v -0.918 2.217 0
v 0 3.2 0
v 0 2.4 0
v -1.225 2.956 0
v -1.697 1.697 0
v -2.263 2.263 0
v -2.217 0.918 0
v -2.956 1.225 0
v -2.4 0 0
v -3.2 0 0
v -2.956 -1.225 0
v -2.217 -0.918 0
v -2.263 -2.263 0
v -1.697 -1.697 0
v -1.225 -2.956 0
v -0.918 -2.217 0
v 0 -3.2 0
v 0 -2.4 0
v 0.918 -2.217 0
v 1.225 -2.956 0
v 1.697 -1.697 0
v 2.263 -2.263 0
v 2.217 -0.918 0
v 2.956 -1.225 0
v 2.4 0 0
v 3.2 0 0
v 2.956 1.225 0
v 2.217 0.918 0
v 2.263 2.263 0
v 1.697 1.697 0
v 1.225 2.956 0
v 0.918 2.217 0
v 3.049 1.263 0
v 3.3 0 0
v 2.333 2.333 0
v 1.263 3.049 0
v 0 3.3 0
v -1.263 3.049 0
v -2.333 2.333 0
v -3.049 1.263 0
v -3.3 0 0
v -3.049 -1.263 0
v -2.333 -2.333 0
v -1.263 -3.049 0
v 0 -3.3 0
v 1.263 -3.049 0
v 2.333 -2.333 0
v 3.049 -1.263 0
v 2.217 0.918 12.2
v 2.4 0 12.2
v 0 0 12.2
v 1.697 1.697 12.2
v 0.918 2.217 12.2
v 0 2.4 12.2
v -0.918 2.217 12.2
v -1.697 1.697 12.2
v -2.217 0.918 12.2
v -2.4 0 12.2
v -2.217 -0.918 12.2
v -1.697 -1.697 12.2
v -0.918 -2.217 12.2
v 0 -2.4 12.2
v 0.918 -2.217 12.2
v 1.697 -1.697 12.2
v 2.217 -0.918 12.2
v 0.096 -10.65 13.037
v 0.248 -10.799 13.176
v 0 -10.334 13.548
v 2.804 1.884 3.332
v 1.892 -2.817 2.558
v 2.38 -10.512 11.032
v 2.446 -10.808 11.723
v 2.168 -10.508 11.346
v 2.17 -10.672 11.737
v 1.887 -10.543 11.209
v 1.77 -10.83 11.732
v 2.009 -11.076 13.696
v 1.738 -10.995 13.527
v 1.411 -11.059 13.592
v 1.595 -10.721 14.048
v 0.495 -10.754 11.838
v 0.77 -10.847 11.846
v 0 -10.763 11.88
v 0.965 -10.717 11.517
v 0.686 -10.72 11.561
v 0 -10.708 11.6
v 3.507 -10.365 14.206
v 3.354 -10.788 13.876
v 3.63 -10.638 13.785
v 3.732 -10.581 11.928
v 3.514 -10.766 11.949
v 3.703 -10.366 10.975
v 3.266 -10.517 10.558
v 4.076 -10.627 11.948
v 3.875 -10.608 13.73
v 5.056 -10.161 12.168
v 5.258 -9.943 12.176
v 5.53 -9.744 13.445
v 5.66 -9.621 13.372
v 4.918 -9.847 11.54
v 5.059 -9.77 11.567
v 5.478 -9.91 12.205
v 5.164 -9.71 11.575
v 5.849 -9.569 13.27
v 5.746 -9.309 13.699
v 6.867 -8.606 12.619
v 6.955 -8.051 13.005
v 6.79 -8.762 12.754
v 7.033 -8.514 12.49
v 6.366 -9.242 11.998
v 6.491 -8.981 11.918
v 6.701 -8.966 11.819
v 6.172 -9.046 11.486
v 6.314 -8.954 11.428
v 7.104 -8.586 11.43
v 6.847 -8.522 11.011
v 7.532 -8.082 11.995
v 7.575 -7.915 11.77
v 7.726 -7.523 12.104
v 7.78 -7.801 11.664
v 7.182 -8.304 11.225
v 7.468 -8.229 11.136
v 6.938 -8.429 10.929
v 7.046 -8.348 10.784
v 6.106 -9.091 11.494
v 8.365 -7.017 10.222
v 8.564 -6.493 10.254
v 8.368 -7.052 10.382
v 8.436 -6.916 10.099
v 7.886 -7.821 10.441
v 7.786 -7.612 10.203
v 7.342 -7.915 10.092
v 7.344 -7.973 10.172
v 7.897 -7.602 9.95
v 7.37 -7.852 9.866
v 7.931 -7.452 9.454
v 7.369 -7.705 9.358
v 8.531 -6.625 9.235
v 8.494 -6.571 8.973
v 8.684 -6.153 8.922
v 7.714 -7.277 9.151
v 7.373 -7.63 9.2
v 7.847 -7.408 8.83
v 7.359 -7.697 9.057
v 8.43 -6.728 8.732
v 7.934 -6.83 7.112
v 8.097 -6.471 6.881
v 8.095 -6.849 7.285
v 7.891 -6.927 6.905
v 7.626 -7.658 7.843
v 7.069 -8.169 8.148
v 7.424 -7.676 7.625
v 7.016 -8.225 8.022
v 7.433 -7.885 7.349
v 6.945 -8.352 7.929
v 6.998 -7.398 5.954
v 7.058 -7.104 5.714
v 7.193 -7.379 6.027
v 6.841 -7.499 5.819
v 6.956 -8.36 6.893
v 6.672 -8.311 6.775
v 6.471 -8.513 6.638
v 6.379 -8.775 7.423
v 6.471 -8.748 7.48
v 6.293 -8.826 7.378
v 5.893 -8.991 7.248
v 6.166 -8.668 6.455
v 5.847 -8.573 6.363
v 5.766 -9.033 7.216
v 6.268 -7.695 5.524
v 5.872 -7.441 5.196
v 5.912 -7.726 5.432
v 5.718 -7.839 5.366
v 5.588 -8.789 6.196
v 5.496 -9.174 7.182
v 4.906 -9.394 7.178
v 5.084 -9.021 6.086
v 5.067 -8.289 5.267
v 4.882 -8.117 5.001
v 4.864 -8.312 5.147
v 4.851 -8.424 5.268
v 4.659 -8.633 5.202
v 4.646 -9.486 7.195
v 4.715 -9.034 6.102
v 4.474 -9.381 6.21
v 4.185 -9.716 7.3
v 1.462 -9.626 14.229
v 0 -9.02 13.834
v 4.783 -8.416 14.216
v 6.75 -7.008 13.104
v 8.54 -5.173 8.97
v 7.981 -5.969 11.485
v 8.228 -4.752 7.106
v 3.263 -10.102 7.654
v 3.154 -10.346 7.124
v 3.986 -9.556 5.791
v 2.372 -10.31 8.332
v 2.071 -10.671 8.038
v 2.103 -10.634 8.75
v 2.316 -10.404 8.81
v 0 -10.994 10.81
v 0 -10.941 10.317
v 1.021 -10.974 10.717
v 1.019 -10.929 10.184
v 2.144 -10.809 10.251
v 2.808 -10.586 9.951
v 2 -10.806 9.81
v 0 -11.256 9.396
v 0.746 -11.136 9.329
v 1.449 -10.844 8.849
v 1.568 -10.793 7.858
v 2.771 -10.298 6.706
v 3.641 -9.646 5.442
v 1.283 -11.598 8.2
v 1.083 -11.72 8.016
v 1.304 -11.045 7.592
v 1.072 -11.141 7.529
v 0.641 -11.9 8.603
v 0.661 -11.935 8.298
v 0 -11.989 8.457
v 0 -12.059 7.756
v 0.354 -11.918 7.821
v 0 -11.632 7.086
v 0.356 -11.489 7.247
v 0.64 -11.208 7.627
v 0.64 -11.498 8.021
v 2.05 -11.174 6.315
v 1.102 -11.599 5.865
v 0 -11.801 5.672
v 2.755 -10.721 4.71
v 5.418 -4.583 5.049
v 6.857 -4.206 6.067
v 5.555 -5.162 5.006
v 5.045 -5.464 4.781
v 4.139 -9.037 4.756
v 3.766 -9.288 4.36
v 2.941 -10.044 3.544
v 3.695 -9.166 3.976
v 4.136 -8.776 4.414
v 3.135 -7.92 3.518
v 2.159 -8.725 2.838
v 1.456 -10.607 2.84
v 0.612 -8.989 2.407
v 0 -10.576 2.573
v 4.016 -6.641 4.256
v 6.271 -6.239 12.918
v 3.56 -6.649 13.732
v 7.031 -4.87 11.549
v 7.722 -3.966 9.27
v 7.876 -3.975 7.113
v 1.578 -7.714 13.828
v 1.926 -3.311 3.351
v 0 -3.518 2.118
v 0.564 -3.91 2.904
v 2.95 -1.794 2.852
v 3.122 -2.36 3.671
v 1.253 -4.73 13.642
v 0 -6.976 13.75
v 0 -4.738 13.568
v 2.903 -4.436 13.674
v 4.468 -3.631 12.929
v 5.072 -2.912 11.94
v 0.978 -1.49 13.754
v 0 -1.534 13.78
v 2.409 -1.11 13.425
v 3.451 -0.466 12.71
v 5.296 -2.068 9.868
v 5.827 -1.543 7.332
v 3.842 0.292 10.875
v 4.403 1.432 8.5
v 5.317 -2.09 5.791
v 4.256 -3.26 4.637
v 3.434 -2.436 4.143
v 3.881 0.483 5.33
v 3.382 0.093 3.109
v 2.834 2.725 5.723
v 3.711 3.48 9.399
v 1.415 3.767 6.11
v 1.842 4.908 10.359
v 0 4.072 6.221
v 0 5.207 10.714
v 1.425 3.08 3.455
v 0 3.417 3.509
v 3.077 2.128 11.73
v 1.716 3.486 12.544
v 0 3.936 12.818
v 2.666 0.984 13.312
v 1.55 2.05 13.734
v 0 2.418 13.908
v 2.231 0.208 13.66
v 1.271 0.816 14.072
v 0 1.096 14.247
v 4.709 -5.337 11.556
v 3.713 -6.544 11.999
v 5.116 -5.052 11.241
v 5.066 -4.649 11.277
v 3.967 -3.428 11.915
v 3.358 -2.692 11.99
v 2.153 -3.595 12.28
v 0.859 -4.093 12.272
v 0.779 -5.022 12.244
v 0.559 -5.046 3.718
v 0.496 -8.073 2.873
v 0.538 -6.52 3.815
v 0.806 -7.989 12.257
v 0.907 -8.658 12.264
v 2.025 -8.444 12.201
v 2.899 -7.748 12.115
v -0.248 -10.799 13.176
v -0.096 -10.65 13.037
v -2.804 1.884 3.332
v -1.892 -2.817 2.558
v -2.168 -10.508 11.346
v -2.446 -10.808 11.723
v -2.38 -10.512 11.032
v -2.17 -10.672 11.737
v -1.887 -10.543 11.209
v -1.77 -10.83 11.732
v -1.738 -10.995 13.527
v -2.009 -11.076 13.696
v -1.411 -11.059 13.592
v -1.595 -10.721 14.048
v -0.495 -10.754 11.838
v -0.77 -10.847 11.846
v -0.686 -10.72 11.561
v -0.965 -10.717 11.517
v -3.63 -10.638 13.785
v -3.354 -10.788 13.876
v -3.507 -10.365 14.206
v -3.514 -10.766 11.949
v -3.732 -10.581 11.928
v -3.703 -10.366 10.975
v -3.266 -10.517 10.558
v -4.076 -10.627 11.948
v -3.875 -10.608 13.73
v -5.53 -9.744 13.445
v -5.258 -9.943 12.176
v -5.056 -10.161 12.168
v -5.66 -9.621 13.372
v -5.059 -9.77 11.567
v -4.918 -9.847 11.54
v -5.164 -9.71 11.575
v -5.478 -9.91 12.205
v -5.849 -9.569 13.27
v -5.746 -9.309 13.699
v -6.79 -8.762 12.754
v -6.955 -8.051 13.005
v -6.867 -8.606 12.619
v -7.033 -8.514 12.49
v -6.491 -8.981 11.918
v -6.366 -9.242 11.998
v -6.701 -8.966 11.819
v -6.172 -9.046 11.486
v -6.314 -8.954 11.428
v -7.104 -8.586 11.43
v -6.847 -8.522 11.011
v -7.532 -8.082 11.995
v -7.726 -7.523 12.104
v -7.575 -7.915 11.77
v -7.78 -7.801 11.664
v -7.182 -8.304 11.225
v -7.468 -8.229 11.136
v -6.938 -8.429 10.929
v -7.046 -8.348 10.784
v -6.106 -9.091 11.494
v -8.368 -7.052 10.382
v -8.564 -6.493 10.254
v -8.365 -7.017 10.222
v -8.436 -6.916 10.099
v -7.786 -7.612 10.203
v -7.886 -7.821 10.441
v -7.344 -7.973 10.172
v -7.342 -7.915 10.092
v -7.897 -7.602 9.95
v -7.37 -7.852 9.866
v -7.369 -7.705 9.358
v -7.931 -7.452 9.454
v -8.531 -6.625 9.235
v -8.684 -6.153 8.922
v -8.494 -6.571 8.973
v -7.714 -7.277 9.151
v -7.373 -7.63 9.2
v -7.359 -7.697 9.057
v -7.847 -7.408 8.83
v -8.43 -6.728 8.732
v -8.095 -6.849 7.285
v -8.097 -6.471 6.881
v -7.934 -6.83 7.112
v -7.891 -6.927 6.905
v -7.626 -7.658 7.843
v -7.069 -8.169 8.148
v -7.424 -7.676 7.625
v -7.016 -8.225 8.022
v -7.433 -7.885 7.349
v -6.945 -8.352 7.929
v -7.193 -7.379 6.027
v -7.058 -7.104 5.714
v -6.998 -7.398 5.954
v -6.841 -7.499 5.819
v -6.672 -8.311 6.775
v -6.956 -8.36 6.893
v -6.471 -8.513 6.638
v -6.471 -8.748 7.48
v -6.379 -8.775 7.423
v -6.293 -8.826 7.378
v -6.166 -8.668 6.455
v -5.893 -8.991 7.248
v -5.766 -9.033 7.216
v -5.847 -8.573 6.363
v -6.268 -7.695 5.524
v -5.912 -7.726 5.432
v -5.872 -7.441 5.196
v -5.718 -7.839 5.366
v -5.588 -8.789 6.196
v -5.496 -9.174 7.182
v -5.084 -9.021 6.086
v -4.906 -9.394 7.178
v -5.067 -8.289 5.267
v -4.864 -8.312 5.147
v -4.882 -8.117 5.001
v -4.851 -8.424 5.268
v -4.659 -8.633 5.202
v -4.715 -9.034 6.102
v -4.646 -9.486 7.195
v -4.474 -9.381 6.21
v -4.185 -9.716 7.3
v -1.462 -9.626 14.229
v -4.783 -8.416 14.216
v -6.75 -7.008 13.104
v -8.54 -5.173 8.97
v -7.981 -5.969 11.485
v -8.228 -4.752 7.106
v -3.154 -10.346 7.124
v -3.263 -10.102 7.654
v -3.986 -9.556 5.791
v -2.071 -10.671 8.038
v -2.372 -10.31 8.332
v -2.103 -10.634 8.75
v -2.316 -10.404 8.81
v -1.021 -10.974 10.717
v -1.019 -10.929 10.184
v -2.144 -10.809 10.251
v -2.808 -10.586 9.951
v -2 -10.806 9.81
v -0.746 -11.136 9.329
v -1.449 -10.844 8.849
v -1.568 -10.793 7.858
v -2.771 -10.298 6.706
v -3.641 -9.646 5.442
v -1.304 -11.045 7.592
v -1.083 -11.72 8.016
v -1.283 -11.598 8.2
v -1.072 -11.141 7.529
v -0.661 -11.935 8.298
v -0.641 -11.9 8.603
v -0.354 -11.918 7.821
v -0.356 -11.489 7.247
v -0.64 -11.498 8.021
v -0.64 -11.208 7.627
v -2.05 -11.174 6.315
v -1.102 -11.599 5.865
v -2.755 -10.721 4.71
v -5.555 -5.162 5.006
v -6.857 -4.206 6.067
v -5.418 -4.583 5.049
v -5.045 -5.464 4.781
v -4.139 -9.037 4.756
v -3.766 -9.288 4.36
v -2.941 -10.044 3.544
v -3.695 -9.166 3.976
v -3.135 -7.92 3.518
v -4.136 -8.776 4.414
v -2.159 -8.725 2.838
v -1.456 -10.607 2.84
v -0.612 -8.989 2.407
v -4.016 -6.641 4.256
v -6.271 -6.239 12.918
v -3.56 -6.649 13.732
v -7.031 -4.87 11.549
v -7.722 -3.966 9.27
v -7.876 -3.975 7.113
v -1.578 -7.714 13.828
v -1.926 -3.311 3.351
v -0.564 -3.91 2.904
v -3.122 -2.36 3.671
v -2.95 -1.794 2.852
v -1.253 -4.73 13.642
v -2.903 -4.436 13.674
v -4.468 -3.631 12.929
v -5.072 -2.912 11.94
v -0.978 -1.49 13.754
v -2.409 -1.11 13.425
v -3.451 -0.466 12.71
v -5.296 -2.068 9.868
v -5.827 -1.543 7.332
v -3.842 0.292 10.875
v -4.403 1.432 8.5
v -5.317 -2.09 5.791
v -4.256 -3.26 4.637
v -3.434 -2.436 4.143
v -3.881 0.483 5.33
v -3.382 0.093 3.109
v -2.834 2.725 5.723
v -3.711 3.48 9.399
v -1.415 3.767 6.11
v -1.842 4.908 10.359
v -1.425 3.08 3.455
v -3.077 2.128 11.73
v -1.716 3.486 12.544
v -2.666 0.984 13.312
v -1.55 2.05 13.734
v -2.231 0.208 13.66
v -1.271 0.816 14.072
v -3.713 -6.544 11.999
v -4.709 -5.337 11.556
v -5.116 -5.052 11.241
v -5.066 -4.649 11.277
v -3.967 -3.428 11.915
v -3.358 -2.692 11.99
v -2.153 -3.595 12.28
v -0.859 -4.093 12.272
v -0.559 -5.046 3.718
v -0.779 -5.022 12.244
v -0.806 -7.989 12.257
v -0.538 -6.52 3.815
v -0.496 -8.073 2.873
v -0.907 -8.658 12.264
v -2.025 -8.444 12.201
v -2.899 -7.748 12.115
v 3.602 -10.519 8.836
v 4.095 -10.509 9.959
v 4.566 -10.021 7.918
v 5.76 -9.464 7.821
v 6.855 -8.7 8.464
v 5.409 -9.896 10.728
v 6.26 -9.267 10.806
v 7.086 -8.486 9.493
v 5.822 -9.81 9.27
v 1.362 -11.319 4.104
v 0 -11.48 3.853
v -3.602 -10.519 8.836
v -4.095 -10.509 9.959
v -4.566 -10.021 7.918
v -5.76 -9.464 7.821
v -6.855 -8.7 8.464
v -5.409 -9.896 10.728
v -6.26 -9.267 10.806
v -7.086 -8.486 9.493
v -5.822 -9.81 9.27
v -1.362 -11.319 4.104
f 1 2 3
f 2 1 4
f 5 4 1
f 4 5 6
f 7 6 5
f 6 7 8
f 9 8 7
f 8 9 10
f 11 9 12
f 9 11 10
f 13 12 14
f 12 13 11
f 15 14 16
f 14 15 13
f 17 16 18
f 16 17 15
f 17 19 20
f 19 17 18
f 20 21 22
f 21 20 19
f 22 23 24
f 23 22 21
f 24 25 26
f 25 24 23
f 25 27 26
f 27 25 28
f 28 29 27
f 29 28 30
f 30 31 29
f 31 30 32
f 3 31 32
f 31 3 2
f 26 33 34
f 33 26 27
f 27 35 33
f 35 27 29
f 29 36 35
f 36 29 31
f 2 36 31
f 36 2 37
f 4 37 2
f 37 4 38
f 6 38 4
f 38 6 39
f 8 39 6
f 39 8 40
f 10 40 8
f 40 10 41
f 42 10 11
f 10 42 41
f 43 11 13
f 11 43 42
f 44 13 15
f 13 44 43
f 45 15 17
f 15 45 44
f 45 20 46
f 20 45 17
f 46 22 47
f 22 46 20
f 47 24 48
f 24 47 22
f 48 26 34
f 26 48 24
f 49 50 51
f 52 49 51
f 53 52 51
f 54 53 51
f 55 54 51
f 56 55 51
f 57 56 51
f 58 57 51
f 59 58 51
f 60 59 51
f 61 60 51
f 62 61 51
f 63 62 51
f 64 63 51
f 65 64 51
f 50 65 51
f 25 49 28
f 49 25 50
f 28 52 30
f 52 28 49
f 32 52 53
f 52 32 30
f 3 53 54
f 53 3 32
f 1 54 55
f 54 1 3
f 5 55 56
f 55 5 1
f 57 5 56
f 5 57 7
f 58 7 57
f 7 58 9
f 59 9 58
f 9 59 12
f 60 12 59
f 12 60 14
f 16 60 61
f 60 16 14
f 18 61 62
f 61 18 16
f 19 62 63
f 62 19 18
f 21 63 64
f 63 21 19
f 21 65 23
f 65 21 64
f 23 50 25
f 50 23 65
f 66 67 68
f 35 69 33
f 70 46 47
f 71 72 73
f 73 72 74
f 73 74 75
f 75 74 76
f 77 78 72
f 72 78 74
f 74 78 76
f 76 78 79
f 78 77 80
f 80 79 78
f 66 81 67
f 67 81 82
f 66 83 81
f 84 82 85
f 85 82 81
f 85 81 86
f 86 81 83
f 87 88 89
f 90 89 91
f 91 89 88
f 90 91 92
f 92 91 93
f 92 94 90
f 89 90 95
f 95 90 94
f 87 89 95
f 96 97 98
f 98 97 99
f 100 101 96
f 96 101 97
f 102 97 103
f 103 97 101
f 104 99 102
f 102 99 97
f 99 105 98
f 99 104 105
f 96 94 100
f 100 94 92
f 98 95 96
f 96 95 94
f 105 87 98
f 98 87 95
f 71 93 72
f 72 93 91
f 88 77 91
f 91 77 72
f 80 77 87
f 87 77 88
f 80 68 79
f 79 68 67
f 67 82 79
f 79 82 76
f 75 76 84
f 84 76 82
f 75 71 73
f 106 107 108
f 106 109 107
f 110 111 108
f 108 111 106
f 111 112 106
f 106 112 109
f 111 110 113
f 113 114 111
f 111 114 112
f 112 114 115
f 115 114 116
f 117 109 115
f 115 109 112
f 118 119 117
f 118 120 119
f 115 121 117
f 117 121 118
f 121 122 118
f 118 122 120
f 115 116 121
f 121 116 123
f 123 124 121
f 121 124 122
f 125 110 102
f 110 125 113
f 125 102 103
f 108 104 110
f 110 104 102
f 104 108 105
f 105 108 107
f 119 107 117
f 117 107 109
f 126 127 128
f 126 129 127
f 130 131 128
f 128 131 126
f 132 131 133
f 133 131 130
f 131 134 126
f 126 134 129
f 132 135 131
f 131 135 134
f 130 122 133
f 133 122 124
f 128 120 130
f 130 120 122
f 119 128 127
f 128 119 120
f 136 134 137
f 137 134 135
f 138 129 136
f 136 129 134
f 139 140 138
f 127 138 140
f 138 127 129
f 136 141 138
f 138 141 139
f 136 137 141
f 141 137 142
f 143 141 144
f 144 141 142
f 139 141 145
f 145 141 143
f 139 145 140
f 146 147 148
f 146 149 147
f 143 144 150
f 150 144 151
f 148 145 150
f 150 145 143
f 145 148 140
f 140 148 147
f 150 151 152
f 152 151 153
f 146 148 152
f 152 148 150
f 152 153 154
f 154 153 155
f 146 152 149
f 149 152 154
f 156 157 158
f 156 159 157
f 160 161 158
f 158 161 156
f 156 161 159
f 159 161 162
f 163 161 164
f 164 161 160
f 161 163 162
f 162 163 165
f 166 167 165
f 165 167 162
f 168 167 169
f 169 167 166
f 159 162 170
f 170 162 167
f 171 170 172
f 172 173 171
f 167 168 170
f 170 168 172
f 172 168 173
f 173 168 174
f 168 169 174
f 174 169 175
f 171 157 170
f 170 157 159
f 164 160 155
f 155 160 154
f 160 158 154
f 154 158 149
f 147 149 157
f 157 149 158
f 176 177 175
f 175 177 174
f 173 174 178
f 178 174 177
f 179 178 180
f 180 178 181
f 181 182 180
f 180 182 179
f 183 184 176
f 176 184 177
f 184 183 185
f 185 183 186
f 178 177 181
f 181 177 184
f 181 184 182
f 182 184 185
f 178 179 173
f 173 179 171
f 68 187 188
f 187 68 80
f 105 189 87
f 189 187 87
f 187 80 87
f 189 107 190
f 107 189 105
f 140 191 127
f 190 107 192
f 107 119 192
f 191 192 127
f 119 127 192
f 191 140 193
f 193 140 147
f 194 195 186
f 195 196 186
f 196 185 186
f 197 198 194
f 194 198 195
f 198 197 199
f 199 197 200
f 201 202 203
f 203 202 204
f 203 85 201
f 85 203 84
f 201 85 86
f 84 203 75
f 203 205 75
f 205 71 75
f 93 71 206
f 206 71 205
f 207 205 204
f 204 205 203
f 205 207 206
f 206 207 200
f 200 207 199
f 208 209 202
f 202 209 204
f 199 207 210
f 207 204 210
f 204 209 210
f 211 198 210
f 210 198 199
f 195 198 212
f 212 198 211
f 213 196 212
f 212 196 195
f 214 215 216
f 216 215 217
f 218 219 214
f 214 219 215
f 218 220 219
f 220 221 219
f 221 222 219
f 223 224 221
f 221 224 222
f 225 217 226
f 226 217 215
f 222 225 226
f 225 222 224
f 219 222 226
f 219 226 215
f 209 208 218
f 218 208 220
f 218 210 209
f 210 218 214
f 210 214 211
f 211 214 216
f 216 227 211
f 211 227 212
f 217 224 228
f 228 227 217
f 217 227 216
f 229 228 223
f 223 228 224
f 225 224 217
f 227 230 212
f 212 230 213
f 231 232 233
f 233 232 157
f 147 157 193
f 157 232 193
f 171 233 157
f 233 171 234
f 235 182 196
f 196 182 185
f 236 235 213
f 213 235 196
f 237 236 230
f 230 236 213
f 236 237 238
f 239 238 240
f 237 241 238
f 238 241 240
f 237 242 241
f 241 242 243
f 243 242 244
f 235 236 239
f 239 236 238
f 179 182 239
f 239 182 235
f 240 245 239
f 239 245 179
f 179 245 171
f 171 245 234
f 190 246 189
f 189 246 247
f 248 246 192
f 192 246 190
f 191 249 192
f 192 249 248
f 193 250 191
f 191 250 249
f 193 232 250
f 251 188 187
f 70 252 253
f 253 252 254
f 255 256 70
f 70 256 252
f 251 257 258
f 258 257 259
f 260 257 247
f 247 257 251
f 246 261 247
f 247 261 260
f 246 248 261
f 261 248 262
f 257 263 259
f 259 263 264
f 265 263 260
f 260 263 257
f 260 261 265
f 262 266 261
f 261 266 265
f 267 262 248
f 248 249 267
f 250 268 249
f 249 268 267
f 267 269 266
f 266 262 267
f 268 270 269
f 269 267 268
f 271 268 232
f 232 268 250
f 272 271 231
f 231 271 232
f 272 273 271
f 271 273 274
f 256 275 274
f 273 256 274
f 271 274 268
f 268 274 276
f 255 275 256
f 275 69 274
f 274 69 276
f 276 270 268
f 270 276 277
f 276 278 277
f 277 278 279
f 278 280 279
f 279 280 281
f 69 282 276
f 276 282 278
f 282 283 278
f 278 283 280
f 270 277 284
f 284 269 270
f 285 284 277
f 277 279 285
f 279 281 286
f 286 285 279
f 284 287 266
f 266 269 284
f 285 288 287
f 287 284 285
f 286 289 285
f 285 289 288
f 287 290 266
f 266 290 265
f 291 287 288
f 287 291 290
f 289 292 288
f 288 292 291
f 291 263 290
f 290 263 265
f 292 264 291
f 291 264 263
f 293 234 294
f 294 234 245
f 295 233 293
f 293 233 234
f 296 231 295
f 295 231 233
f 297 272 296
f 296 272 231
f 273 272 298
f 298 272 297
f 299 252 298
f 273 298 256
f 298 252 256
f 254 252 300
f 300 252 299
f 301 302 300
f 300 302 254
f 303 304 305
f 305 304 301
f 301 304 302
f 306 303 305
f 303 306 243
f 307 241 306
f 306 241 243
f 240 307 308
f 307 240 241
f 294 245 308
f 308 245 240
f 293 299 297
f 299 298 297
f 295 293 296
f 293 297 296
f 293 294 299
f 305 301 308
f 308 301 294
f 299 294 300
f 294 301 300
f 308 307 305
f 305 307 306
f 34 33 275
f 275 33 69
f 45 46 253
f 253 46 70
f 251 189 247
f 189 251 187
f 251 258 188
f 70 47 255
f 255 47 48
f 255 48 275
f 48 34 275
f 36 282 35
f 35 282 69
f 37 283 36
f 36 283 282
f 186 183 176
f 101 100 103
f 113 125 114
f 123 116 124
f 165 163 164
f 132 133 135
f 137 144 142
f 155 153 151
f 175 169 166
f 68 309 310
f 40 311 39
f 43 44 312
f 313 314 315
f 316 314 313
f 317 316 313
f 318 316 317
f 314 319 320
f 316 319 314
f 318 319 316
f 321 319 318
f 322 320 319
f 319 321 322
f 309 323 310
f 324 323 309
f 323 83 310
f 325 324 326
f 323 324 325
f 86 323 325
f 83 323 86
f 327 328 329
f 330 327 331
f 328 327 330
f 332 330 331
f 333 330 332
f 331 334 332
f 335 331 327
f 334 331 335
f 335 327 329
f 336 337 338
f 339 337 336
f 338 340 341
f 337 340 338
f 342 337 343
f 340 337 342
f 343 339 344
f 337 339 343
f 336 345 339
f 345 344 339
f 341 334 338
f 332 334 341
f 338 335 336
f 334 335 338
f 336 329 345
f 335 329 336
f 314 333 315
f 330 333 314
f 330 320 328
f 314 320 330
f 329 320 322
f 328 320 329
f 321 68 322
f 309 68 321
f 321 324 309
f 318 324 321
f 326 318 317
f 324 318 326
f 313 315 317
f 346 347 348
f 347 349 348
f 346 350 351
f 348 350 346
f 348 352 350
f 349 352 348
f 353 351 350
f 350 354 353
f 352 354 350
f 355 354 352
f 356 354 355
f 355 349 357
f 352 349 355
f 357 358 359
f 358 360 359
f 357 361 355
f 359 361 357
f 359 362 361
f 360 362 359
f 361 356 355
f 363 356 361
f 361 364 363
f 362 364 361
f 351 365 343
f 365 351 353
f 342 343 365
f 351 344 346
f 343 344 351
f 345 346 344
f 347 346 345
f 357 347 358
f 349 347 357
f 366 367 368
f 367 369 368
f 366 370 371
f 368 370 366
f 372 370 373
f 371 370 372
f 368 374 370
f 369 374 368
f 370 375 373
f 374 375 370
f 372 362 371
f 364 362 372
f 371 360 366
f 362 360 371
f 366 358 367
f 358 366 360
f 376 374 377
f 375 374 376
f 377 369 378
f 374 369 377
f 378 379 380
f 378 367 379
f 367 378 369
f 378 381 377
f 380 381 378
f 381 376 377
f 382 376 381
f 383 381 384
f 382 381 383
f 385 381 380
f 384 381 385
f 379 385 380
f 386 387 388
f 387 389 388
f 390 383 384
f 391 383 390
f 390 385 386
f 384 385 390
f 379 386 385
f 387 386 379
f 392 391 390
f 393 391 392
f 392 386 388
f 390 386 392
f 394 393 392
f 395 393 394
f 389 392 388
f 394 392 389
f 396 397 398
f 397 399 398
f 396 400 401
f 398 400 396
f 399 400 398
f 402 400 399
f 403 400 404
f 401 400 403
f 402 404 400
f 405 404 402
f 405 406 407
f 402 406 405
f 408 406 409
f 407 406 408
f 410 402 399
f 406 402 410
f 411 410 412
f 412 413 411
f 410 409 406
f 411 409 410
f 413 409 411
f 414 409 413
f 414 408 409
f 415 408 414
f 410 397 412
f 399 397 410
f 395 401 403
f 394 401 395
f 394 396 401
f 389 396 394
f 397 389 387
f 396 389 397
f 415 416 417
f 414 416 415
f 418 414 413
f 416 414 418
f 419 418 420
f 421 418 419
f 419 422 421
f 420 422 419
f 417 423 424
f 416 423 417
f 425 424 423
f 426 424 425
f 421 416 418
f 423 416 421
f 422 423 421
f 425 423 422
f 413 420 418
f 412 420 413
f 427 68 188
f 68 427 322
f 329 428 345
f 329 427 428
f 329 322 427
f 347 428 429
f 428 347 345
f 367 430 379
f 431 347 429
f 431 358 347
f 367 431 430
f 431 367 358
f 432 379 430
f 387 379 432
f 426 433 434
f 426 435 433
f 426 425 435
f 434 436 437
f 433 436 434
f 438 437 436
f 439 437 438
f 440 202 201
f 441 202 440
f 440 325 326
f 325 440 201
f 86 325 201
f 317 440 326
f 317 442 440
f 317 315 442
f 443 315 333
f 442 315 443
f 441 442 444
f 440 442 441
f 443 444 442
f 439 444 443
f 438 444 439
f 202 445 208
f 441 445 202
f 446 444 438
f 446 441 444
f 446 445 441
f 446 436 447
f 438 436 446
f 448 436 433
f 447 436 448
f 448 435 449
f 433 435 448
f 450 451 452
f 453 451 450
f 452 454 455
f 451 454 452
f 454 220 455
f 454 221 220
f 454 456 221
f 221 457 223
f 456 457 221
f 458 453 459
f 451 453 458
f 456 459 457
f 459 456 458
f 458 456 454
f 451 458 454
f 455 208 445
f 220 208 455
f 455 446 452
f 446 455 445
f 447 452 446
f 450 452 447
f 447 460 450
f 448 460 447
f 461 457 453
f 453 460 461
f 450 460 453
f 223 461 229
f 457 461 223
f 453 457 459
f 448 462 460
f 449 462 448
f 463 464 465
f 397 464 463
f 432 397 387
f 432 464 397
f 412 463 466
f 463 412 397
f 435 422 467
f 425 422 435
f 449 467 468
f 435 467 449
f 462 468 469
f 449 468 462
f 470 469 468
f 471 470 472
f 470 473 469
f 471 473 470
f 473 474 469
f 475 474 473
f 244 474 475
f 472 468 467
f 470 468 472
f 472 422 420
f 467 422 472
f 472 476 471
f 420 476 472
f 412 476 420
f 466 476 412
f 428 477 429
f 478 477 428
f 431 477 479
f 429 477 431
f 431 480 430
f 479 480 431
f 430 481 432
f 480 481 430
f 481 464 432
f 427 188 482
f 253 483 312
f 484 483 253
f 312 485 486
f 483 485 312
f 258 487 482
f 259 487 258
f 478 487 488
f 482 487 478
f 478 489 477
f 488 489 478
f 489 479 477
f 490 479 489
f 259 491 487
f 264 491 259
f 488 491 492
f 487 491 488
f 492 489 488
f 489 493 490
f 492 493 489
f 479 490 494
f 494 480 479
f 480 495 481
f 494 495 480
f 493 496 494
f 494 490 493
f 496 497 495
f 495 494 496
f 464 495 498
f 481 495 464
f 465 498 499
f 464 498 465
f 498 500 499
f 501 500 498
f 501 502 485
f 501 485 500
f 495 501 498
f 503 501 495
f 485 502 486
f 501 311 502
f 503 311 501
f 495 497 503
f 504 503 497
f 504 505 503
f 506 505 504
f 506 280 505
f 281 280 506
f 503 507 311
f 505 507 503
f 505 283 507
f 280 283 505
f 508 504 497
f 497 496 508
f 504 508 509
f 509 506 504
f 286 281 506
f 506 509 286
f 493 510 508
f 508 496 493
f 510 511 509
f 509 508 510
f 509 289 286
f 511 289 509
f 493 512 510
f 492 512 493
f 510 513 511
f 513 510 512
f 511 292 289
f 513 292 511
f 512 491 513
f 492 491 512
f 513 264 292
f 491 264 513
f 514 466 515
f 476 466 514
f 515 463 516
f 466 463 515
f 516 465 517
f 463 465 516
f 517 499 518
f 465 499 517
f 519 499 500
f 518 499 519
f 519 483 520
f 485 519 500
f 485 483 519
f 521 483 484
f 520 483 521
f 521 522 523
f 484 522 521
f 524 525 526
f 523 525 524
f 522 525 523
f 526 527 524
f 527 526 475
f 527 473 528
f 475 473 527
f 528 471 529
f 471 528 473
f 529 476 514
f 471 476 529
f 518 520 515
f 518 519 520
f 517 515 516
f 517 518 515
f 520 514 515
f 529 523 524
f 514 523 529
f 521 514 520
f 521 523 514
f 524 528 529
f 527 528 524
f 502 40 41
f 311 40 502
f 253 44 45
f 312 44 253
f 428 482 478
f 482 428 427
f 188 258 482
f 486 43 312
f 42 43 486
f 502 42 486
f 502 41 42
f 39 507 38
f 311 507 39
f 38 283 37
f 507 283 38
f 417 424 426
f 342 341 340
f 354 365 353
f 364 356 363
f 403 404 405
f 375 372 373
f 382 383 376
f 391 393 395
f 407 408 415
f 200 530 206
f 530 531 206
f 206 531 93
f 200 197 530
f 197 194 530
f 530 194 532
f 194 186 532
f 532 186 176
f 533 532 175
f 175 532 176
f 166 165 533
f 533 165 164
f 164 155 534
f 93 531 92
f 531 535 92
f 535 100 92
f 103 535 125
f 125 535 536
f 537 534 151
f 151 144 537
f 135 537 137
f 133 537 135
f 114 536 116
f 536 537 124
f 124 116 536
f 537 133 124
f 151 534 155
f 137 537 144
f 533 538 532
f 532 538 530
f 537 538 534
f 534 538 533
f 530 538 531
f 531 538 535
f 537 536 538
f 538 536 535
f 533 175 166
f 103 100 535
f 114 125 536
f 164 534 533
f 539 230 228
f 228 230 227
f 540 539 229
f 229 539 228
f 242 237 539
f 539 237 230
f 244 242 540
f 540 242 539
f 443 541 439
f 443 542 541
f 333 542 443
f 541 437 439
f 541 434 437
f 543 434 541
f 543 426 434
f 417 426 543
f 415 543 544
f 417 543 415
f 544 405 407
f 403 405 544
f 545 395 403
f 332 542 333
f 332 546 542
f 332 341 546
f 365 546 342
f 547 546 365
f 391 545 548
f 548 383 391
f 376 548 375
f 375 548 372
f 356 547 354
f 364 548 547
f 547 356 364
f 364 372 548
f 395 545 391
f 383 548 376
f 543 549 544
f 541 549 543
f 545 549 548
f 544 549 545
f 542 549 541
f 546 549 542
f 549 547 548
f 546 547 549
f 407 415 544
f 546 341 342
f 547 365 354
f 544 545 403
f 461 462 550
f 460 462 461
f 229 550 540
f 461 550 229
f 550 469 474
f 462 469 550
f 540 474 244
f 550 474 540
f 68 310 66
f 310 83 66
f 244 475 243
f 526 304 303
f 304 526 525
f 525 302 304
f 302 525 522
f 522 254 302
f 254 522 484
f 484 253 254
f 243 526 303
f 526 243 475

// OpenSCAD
use <../lib.scad>
use <../p/4-4cylc.scad>
use <../p/4-4edge.scad>
use <../p/4-4rin32.scad>
use <../p/4-4ring3.scad>
use <s/27956s01.scad>
use <s/27956s02.scad>
function ldraw_lib__27956() = [
// 0 Minifig Head Alien E. T.
// 0 Name: 27956.dat
// 0 Author: Gerald Lasser [GeraldLasser]
// 0 !LDRAW_ORG Part UPDATE 2022-01
// 0 !LICENSE Licensed under CC BY 4.0 : see CAreadme.txt
// 
// 0 BFC CERTIFY CCW
  [0,"BFC","CERTIFY"],
  [0,"BFC","CCW"],
// 
// 0 !KEYWORDS Dimensions, ET, Extra Terrestrial
// 
// 0 !HISTORY 2018-01-28 {LEGO Digital Designer} Original part shape
// 0 !HISTORY 2018-01-28 [GeraldLasser] File preparation for LDraw Parts Tracker
// 0 !HISTORY 2022-01-14 [PTadmin] Official Update 2022-01
// 
// 
// 1 16 0 0 0 2 0 0 0 -1 0 0 0 2 4-4ring3.dat
  [1,16,0,0,0,2,0,0,0,-1,0,0,0,2, ldraw_lib__4_4ring3()],
// 1 16 0 0 0 0.25 0 0 0 -1 0 0 0 0.25 4-4rin32.dat
  [1,16,0,0,0,0.25,0,0,0,-1,0,0,0,0.25, ldraw_lib__4_4rin32()],
// 1 16 0 0 0 8.25 0 0 0 -1 0 0 0 8.25 4-4edge.dat
  [1,16,0,0,0,8.25,0,0,0,-1,0,0,0,8.25, ldraw_lib__4_4edge()],
// 0 BFC INVERTNEXT
  [0,"BFC","INVERTNEXT"],
// 1 16 0 -30.5 0 6 0 0 0 30.5 0 0 0 6 4-4cylc.dat
  [1,16,0,-30.5,0,6,0,0,0,30.5,0,0,0,6, ldraw_lib__4_4cylc()],
// 1 16 0 0 0 1 0 0 0 1 0 0 0 1 s\27956s01.dat
  [1,16,0,0,0,1,0,0,0,1,0,0,0,1, ldraw_lib__s__27956s01()],
// 1 16 0 0 0 -1 0 0 0 1 0 0 0 1 s\27956s01.dat
  [1,16,0,0,0,-1,0,0,0,1,0,0,0,1, ldraw_lib__s__27956s01()],
// 
// 1 16 0 0 0 1 0 0 0 1 0 0 0 1 s\27956s02.dat
  [1,16,0,0,0,1,0,0,0,1,0,0,0,1, ldraw_lib__s__27956s02()],
// 1 16 0 0 0 -1 0 0 0 1 0 0 0 1 s\27956s02.dat
  [1,16,0,0,0,-1,0,0,0,1,0,0,0,1, ldraw_lib__s__27956s02()],
// 
// 3 16 0 -33.871 -25.834 -0.24 -32.592 -26.626 0.24 -32.592 -26.626
  [3,16,0,-33.871,-25.834,-0.24,-32.592,-26.626,0.24,-32.592,-26.626],
// 3 16 -0.24 -32.592 -26.626 0 -29.699 -26.907 0.24 -32.592 -26.626
  [3,16,-0.24,-32.592,-26.626,0,-29.699,-26.907,0.24,-32.592,-26.626],
// 3 16 0 -6.433 -26.44 -1.531 -6.018 -22.473 1.531 -6.018 -22.473
  [3,16,0,-6.433,-26.44,-1.531,-6.018,-22.473,1.531,-6.018,-22.473],
// 4 16 -1.346 -9.538 -16.299 1.346 -9.538 -16.299 1.24 -7.183 -20.182 -1.24 -7.183 -20.182
  [4,16,-1.346,-9.538,-16.299,1.346,-9.538,-16.299,1.24,-7.183,-20.182,-1.24,-7.183,-20.182],
// 4 16 -1.397 -9.295 -12.614 1.397 -9.295 -12.614 1.346 -9.538 -16.299 -1.346 -9.538 -16.299
  [4,16,-1.397,-9.295,-12.614,1.397,-9.295,-12.614,1.346,-9.538,-16.299,-1.346,-9.538,-16.299],
// 4 16 -1.41 -7.26 -9.774 1.41 -7.26 -9.774 1.397 -9.295 -12.614 -1.397 -9.295 -12.614
  [4,16,-1.41,-7.26,-9.774,1.41,-7.26,-9.774,1.397,-9.295,-12.614,-1.397,-9.295,-12.614],
// 3 16 -1.41 -7.26 -9.774 0 -5.294 -8.795 1.41 -7.26 -9.774
  [3,16,-1.41,-7.26,-9.774,0,-5.294,-8.795,1.41,-7.26,-9.774],
// 4 16 1.531 -6.018 -22.473 -1.531 -6.018 -22.473 -1.24 -7.183 -20.182 1.24 -7.183 -20.182
  [4,16,1.531,-6.018,-22.473,-1.531,-6.018,-22.473,-1.24,-7.183,-20.182,1.24,-7.183,-20.182],
// 5 24 -1.531 -6.018 -22.473 1.531 -6.018 -22.473 0 -6.433 -26.44 1.24 -7.183 -20.182
  [5,24,-1.531,-6.018,-22.473,1.531,-6.018,-22.473,0,-6.433,-26.44,1.24,-7.183,-20.182],
// 5 24 1.41 -7.26 -9.774 -1.41 -7.26 -9.774 -1.397 -9.295 -12.614 0 -5.294 -8.795
  [5,24,1.41,-7.26,-9.774,-1.41,-7.26,-9.774,-1.397,-9.295,-12.614,0,-5.294,-8.795],
// 5 24 1.24 -7.183 -20.182 -1.24 -7.183 -20.182 -1.531 -6.018 -22.473 1.346 -9.538 -16.299
  [5,24,1.24,-7.183,-20.182,-1.24,-7.183,-20.182,-1.531,-6.018,-22.473,1.346,-9.538,-16.299],
// 5 24 -1.397 -9.295 -12.614 1.397 -9.295 -12.614 1.41 -7.26 -9.774 -1.346 -9.538 -16.299
  [5,24,-1.397,-9.295,-12.614,1.397,-9.295,-12.614,1.41,-7.26,-9.774,-1.346,-9.538,-16.299],
// 5 24 -1.346 -9.538 -16.299 1.346 -9.538 -16.299 -1.24 -7.183 -20.182 1.397 -9.295 -12.614
  [5,24,-1.346,-9.538,-16.299,1.346,-9.538,-16.299,-1.24,-7.183,-20.182,1.397,-9.295,-12.614],
// 5 24 .24 -32.592 -26.626 -.24 -32.592 -26.626 0 -29.699 -26.907 0 -33.871 -25.834
  [5,24,.24,-32.592,-26.626,-.24,-32.592,-26.626,0,-29.699,-26.907,0,-33.871,-25.834],
// 5 24 -.24 -32.592 -26.626 0 -29.699 -26.907 -1.238 -29.596 -26.885 .24 -32.592 -26.626
  [5,24,-.24,-32.592,-26.626,0,-29.699,-26.907,-1.238,-29.596,-26.885,.24,-32.592,-26.626],
// 5 24 0 -29.699 -26.907 .24 -32.592 -26.626 -.24 -32.592 -26.626 1.238 -29.596 -26.885
  [5,24,0,-29.699,-26.907,.24,-32.592,-26.626,-.24,-32.592,-26.626,1.238,-29.596,-26.885],
// 5 24 0 -28.999 -26.769 0 -29.699 -26.907 -1.238 -29.596 -26.885 1.238 -29.596 -26.885
  [5,24,0,-28.999,-26.769,0,-29.699,-26.907,-1.238,-29.596,-26.885,1.238,-29.596,-26.885],
// 5 24 0 -25.793 -27.352 0 -23.491 -28.139 1.865 -23.322 -27.841 -1.865 -23.322 -27.841
  [5,24,0,-25.793,-27.352,0,-23.491,-28.139,1.865,-23.322,-27.841,-1.865,-23.322,-27.841],
// 5 24 0 -23.491 -28.139 0 -21.143 -29.973 1.602 -21.508 -29.749 -1.602 -21.508 -29.749
  [5,24,0,-23.491,-28.139,0,-21.143,-29.973,1.602,-21.508,-29.749,-1.602,-21.508,-29.749],
// 5 24 0 -19.391 -30.147 0 -17.714 -29.08 .89 -18.117 -28.723 -.89 -18.117 -28.723
  [5,24,0,-19.391,-30.147,0,-17.714,-29.08,.89,-18.117,-28.723,-.89,-18.117,-28.723],
// 
// 0 // Condlines for Merging
// 5 24 0 -17.714 -29.08 0 -14.181 -29.502 -2.755 -14.663 -28.998 2.755 -14.663 -28.998
  [5,24,0,-17.714,-29.08,0,-14.181,-29.502,-2.755,-14.663,-28.998,2.755,-14.663,-28.998],
// 5 24 0 -14.181 -29.502 0 -9.633 -28.699 3.405 -10.261 -28.297 -3.405 -10.261 -28.297
  [5,24,0,-14.181,-29.502,0,-9.633,-28.699,3.405,-10.261,-28.297,-3.405,-10.261,-28.297],
// 5 24 0 -9.633 -28.699 0 -6.433 -26.44 3.641 -7.099 -26.517 -3.641 -7.099 -26.517
  [5,24,0,-9.633,-28.699,0,-6.433,-26.44,3.641,-7.099,-26.517,-3.641,-7.099,-26.517],
// 5 24 0 -33.871 -25.834 0 -34.585 -22.551 3.655 -35.573 -24.064 -3.655 -35.573 -24.064
  [5,24,0,-33.871,-25.834,0,-34.585,-22.551,3.655,-35.573,-24.064,-3.655,-35.573,-24.064],
// 5 24 0 -34.585 -22.551 0 -34.374 -17.439 -3.945 -34.569 -19.285 3.945 -34.569 -19.285
  [5,24,0,-34.585,-22.551,0,-34.374,-17.439,-3.945,-34.569,-19.285,3.945,-34.569,-19.285],
// 5 24 0 -34.374 -17.439 0 -33.921 -11.844 3.132 -34.105 -11.825 -3.132 -34.105 -11.825
  [5,24,0,-34.374,-17.439,0,-33.921,-11.844,3.132,-34.105,-11.825,-3.132,-34.105,-11.825],
// 5 24 0 -33.921 -11.844 0 -34.449 -3.835 2.444 -34.385 -3.726 -2.444 -34.385 -3.726
  [5,24,0,-33.921,-11.844,0,-34.449,-3.835,2.444,-34.385,-3.726,-2.444,-34.385,-3.726],
// 5 24 0 -35.617 2.74 0 -34.449 -3.835 3.178 -35.181 2.04 -3.178 -35.181 2.04
  [5,24,0,-35.617,2.74,0,-34.449,-3.835,3.178,-35.181,2.04,-3.178,-35.181,2.04],
// 5 24 0 -34.771 6.045 0 -35.617 2.74 -3.876 -34.334 5.124 3.876 -34.334 5.124
  [5,24,0,-34.771,6.045,0,-35.617,2.74,-3.876,-34.334,5.124,3.876,-34.334,5.124],
// 5 24 0 -32.045 9.84 0 -34.771 6.045 4.289 -31.361 8.716 -4.289 -31.361 8.716
  [5,24,0,-32.045,9.84,0,-34.771,6.045,4.289,-31.361,8.716,-4.289,-31.361,8.716],
// 5 24 0 -32.045 9.84 0 -26.786 13.018 4.605 -25.897 12.271 -4.605 -25.897 12.271
  [5,24,0,-32.045,9.84,0,-26.786,13.018,4.605,-25.897,12.271,-4.605,-25.897,12.271],
// 5 24 0 0 8.25 0 -8.773 8.543 3.157 0 7.622 -3.157 0 7.622
  [5,24,0,0,8.25,0,-8.773,8.543,3.157,0,7.622,-3.157,0,7.622],
// 5 24 0 -8.773 8.543 0 -15.553 10.18 3.538 -15.275 9.418 -3.538 -15.275 9.418
  [5,24,0,-8.773,8.543,0,-15.553,10.18,3.538,-15.275,9.418,-3.538,-15.275,9.418],
// 5 24 0 -15.553 10.18 0 -26.786 13.018 4.605 -25.897 12.271 -4.605 -25.897 12.271
  [5,24,0,-15.553,10.18,0,-26.786,13.018,4.605,-25.897,12.271,-4.605,-25.897,12.271],
// 5 24 0 -27.026 -27.485 0 -28.999 -26.769 1.714 -28.902 -26.799 -1.714 -28.902 -26.799
  [5,24,0,-27.026,-27.485,0,-28.999,-26.769,1.714,-28.902,-26.799,-1.714,-28.902,-26.799],
// 5 24 0 -19.391 -30.147 0 -21.143 -29.973 -1.652 -20.744 -29.838 1.652 -20.744 -29.838
  [5,24,0,-19.391,-30.147,0,-21.143,-29.973,-1.652,-20.744,-29.838,1.652,-20.744,-29.838],
// 5 24 0 0 -8.25 0 -5.294 -8.795 3.157 0 -7.622 -3.157 0 -7.622
  [5,24,0,0,-8.25,0,-5.294,-8.795,3.157,0,-7.622,-3.157,0,-7.622],
// 5 24 0 -27.026 -27.485 0 -25.793 -27.352 -2.552 -26.792 -27.436 2.552 -26.792 -27.436
  [5,24,0,-27.026,-27.485,0,-25.793,-27.352,-2.552,-26.792,-27.436,2.552,-26.792,-27.436],
];
module ldraw_lib__27956(step=0, col=false, unit=2/5, alt=false, line=0.2, solid=!$preview)
    makepoly(ldraw_lib__27956(), step=step, col=col, unit=unit, alt=alt, line=line, solid=solid);
ldraw_lib__27956(line=0.2);
